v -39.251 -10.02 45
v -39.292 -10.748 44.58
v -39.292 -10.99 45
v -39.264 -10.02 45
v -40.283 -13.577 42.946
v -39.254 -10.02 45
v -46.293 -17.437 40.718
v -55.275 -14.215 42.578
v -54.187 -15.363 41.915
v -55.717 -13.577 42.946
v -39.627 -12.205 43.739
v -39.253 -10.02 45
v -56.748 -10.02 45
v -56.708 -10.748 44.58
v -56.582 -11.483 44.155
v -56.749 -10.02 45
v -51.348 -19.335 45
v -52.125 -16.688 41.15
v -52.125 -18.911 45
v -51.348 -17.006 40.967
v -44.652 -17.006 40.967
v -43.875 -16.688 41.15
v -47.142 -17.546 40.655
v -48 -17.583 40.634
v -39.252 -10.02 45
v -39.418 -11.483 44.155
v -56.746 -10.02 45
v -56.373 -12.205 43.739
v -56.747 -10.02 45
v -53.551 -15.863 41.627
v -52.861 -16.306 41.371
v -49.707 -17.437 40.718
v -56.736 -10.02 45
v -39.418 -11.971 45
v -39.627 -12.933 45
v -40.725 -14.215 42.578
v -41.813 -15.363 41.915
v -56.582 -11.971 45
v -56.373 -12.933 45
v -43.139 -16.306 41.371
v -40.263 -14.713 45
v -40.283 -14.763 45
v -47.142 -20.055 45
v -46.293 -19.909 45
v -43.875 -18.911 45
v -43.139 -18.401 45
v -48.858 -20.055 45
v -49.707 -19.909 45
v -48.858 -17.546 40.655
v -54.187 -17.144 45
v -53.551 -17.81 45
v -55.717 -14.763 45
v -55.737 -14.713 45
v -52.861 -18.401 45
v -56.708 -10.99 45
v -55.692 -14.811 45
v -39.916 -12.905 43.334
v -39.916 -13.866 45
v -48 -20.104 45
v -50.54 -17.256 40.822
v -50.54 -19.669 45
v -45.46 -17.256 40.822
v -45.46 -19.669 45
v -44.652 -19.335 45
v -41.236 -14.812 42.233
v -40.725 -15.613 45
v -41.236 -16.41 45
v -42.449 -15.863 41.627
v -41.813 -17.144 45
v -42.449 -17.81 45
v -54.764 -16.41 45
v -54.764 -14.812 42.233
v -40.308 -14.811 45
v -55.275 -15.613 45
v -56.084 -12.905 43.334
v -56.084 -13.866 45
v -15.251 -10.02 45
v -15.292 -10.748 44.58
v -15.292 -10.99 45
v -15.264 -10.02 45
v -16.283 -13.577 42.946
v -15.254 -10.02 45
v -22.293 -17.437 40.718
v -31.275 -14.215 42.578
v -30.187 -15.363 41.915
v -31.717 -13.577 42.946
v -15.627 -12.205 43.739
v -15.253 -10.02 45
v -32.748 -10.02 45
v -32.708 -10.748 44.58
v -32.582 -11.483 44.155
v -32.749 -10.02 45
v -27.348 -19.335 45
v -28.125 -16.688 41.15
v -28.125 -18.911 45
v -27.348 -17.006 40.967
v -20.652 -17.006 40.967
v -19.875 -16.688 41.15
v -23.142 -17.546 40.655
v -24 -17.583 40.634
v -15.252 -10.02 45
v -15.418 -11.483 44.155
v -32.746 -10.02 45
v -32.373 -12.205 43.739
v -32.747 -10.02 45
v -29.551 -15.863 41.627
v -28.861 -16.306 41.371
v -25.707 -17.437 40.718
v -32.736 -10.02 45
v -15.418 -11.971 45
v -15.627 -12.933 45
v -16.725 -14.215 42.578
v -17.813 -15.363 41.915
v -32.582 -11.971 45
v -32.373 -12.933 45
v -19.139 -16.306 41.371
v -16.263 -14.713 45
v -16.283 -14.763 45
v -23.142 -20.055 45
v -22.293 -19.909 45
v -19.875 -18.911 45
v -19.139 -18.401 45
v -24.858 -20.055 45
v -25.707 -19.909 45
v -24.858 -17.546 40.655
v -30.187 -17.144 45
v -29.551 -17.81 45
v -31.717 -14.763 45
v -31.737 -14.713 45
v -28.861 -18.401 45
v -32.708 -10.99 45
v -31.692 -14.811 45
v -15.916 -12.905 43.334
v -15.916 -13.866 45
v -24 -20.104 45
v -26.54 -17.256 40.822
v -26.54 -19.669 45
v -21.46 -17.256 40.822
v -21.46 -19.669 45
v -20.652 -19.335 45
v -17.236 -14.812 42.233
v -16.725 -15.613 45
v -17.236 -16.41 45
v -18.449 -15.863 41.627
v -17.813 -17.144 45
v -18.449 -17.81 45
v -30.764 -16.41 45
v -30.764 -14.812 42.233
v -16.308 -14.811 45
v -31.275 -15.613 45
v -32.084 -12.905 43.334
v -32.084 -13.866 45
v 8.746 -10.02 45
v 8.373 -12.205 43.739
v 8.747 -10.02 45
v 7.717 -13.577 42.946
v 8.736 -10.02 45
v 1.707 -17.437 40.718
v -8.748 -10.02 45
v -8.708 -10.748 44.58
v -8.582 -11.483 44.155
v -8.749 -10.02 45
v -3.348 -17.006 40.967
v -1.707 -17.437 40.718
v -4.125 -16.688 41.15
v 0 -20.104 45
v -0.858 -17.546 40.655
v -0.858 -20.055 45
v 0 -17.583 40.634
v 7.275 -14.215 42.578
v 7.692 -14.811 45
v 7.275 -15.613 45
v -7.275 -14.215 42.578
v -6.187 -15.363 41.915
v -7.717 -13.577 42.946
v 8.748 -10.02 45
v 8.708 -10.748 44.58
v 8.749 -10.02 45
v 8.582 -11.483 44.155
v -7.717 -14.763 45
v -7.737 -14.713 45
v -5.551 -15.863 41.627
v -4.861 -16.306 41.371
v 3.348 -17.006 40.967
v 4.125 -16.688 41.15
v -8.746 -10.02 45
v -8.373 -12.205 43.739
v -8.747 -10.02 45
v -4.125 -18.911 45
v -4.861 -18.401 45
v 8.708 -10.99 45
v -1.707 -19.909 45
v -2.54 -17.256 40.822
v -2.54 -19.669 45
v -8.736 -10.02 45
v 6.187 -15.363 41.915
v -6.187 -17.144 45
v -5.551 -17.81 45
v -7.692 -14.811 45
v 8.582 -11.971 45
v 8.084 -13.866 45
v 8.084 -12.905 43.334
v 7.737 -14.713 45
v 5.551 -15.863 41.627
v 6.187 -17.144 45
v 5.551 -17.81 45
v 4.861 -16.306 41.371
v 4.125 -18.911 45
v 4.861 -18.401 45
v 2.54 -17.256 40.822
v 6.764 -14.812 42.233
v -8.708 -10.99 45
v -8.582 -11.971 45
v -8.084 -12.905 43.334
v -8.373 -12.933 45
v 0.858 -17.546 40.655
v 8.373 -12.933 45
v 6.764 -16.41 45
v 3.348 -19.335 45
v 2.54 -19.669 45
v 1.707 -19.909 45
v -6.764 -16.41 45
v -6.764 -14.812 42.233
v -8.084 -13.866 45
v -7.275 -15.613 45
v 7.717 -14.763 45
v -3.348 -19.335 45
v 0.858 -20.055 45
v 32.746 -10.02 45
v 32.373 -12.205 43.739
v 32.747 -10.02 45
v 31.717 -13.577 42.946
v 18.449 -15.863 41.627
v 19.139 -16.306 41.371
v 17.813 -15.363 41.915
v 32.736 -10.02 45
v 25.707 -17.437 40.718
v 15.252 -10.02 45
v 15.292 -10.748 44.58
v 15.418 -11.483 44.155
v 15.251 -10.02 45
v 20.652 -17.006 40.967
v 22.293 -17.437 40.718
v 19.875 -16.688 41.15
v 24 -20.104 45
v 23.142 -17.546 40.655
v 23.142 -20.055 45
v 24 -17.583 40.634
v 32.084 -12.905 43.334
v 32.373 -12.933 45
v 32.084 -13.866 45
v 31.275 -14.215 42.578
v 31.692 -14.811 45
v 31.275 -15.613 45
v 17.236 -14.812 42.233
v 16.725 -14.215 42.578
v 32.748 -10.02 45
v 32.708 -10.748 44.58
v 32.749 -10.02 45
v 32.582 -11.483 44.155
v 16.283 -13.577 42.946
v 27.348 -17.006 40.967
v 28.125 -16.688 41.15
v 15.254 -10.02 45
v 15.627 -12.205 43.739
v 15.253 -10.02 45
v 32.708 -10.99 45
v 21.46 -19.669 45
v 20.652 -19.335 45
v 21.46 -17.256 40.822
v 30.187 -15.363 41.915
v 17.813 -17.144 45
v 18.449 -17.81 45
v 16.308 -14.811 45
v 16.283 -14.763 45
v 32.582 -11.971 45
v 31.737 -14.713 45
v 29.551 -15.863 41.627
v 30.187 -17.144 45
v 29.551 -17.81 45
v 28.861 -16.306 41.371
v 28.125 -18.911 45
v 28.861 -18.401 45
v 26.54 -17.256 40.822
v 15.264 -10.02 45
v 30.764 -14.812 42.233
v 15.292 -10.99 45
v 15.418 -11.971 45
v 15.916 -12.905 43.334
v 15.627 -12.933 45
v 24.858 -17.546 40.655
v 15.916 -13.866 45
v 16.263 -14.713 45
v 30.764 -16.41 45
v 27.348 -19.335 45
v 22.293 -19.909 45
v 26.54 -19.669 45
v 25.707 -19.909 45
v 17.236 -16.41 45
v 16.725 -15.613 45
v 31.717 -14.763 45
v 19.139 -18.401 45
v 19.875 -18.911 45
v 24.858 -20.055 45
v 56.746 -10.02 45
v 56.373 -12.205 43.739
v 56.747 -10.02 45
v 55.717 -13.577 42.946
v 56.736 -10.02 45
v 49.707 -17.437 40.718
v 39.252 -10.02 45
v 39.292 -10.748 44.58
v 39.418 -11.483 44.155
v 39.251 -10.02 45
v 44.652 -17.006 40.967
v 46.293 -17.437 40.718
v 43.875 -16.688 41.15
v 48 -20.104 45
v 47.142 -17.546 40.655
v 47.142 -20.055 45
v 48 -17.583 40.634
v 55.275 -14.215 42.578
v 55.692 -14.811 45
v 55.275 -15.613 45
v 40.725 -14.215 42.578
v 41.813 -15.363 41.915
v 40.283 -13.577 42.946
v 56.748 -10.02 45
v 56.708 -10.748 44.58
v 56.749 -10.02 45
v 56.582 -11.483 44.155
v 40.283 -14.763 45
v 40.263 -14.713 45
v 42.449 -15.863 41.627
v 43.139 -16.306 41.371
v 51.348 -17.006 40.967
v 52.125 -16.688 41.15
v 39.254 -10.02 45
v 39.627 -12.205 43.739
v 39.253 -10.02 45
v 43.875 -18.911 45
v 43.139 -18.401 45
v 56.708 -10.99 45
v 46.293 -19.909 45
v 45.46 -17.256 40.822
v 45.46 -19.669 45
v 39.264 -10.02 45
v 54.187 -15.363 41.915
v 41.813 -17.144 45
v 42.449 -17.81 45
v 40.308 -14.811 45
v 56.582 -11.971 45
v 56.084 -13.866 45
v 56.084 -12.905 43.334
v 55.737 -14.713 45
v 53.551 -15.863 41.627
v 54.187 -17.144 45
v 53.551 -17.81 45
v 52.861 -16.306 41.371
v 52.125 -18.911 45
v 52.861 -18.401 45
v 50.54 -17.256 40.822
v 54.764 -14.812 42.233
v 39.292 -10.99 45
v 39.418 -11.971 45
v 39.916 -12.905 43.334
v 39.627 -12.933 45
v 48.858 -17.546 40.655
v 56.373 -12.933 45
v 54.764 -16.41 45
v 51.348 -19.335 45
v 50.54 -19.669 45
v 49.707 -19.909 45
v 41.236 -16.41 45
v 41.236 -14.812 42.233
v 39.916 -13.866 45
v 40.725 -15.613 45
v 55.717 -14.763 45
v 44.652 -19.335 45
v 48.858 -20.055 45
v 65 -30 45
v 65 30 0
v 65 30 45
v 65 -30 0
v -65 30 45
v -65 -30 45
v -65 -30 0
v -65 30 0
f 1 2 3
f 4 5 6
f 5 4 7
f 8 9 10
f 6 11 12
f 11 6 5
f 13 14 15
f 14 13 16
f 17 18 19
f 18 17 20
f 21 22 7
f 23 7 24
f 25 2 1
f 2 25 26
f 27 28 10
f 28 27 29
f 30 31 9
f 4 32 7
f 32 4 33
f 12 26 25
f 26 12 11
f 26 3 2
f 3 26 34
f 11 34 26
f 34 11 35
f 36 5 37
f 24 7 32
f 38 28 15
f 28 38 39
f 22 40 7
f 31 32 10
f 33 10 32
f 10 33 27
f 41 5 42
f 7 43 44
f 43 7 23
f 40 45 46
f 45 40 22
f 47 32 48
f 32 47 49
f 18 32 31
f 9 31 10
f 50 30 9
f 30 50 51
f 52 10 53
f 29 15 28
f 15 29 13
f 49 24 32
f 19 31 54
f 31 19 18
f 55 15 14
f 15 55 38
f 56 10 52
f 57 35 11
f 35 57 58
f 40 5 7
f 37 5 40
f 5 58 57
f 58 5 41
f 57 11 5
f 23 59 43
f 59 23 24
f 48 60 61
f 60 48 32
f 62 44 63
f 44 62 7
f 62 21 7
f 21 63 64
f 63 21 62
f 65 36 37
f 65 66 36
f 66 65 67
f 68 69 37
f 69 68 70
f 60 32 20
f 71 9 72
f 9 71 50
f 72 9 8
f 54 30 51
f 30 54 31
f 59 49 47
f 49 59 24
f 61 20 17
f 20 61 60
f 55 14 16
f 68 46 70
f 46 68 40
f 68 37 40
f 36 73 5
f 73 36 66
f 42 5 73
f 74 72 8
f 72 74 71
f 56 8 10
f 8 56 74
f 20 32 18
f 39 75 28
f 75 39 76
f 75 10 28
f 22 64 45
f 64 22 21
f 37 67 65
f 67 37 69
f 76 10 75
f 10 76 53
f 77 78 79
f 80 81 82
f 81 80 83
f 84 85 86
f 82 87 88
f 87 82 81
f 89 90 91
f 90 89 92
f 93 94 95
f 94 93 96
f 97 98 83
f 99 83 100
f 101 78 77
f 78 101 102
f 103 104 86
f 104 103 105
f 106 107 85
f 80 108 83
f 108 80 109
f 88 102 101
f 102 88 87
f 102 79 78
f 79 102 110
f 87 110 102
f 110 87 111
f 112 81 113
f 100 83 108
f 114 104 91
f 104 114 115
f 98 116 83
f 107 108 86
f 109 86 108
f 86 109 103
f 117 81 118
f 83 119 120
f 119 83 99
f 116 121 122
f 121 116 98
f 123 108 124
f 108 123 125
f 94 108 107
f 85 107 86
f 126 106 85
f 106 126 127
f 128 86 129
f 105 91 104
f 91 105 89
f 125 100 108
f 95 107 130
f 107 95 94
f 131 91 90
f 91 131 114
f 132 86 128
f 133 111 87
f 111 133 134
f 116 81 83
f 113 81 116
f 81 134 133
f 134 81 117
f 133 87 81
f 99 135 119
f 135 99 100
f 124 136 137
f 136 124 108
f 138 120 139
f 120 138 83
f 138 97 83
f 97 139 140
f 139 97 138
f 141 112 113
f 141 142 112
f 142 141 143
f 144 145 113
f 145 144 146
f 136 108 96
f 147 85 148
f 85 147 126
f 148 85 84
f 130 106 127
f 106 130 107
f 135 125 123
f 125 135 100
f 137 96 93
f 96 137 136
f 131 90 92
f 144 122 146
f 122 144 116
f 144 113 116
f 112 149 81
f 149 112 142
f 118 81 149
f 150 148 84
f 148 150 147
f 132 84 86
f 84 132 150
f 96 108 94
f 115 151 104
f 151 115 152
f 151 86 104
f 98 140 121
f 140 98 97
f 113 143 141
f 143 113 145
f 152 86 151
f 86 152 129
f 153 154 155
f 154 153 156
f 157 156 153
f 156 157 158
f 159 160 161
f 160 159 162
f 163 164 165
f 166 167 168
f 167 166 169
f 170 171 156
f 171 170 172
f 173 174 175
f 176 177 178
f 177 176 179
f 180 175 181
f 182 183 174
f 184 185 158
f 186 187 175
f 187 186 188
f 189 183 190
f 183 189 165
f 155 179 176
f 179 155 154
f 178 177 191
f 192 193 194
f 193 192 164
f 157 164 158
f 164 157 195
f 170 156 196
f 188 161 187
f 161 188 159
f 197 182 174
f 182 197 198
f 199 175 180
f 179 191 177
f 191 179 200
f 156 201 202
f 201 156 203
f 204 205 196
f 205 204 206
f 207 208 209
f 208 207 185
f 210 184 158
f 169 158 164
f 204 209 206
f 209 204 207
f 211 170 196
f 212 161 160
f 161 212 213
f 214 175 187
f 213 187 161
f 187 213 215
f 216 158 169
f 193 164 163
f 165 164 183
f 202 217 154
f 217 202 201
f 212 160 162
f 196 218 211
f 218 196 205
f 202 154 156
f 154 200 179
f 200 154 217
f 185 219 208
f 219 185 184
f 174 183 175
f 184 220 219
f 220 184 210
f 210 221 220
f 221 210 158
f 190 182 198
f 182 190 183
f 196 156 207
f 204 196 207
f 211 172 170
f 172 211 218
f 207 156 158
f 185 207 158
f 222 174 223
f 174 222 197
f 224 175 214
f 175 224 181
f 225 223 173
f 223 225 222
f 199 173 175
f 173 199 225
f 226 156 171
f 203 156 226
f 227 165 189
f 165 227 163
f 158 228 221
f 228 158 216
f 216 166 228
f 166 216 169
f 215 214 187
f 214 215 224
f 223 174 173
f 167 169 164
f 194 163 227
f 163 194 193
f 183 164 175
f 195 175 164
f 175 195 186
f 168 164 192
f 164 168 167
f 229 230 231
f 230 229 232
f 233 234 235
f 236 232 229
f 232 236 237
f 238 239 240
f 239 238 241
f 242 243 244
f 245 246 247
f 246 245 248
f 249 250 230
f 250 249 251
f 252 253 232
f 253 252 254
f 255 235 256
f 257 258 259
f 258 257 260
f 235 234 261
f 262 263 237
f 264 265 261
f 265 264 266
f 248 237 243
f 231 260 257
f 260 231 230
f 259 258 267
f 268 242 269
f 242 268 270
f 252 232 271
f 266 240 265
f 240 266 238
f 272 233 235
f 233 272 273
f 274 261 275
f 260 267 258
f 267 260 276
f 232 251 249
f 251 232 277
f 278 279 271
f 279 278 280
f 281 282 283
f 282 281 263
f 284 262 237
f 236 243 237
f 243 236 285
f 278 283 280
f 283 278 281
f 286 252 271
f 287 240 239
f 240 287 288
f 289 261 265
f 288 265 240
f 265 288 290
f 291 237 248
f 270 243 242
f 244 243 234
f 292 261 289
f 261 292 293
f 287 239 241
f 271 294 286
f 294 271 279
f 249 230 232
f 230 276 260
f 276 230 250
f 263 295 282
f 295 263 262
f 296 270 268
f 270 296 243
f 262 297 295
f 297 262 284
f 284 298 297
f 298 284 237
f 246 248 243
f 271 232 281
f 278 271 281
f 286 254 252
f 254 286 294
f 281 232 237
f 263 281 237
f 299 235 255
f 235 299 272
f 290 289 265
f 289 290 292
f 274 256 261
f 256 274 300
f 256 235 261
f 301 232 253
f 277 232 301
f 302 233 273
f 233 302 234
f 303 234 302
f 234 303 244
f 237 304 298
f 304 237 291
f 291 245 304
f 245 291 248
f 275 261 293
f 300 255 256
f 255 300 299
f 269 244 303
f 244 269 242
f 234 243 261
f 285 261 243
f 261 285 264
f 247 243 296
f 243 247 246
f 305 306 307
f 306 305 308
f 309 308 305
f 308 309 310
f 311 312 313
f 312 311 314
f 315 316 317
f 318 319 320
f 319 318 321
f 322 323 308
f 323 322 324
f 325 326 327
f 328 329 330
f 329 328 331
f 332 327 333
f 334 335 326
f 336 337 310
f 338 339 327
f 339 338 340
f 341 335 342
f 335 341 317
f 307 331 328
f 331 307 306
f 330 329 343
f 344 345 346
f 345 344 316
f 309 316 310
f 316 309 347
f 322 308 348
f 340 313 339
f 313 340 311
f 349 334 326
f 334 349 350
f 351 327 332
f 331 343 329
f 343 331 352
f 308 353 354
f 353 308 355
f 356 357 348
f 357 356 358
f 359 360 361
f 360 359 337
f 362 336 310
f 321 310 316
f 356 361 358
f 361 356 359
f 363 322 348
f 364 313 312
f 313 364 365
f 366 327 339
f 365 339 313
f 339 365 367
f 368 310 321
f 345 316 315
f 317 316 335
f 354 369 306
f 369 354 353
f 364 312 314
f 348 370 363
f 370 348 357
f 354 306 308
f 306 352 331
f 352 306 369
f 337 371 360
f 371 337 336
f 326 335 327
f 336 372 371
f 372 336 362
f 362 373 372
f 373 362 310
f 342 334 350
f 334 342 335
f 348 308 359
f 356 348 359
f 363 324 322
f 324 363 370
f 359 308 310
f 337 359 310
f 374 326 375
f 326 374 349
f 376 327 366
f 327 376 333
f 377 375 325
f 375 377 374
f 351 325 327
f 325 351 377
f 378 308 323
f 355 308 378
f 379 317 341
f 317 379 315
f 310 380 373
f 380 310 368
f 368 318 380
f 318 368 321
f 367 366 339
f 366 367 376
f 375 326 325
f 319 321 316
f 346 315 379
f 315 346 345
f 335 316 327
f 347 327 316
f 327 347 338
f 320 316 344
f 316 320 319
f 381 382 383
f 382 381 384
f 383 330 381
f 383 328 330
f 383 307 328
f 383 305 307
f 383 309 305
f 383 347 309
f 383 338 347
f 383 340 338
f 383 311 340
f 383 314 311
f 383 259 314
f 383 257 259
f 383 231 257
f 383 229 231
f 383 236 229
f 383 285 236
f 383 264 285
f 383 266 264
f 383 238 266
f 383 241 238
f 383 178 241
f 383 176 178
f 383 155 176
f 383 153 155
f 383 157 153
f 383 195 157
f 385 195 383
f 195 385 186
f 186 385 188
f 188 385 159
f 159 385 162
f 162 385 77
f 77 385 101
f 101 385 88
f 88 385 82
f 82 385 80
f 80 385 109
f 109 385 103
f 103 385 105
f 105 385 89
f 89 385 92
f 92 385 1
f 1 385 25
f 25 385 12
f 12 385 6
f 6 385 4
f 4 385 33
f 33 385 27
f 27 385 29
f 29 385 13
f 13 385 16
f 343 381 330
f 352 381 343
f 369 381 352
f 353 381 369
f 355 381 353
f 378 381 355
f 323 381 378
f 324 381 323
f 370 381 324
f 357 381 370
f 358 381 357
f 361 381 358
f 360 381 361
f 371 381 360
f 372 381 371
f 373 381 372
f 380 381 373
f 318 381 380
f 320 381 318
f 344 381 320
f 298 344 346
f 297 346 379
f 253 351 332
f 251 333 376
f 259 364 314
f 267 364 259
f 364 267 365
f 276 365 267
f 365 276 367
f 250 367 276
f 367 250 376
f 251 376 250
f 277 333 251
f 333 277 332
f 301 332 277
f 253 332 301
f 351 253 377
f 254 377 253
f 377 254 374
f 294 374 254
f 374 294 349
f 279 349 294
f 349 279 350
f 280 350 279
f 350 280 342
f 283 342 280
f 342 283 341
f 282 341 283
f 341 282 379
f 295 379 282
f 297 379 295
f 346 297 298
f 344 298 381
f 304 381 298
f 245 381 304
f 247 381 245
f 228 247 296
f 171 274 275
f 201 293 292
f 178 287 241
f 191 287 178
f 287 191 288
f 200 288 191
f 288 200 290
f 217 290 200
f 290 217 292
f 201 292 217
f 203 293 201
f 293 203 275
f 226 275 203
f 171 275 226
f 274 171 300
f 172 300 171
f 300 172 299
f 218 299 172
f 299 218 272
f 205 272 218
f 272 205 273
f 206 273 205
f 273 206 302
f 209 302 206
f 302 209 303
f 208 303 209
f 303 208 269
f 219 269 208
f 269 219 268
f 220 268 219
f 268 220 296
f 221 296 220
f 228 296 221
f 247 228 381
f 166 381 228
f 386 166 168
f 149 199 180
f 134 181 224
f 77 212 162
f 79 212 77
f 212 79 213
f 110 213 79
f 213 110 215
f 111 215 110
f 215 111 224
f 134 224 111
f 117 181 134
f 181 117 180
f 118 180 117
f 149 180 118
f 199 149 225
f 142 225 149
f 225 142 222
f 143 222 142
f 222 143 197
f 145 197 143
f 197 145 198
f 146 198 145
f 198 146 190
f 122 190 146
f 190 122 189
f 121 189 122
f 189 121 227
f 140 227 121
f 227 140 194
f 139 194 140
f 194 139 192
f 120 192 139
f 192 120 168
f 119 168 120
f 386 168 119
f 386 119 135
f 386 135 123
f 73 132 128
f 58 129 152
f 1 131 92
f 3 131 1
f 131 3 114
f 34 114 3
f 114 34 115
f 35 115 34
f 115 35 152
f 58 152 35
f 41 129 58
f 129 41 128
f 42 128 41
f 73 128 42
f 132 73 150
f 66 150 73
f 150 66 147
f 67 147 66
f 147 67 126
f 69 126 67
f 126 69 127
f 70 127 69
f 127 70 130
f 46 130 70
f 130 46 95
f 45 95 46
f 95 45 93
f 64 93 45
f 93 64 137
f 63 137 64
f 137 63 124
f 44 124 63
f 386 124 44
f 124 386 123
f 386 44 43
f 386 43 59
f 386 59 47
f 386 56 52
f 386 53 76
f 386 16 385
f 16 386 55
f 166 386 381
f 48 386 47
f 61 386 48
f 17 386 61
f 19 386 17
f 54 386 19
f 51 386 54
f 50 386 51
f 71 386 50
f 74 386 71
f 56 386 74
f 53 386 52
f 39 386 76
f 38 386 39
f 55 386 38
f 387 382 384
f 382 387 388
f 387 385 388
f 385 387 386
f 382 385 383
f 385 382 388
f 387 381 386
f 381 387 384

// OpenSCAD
// --- Parameters ---
// Block dimensions
block_x = 130;           // Total length (X)
block_y = 60;            // Total depth (Y)
block_z = 45;            // Total height (Z)

// Hole properties
hole_diameter = 17.5;    // Diameter of the conical tube hole
hole_depth = 40;         // Depth of the hole along its axis
num_holes = 5;           // Number of tubes
hole_spacing = 24;       // Distance between hole centers along X

// Tilt properties
tilt_angle = 30;         // Angle from vertical in YZ plane
tilt_y_offset = -10;      // Y-coordinate where the hole axis meets the top face

// Resolution
fn_val = 64;             // Smoothness for cylinders

// --- Calculations ---
// The block is centered on X and Y, resting on Z=0.
// X range: [-65, 65], Y range: [-30, 30], Z range: [0, 45]
hole_span = (num_holes - 1) * hole_spacing;
first_hole_x = -hole_span / 2;

// --- Modeling ---

difference() {
    // Main Block
    // Positioned so it rests on Z=0 and is centered on X and Y
    translate([-block_x/2, -block_y/2, 0])
        cube([block_x, block_y, block_z]);

    // The five blind holes
    for (i = [0 : num_holes - 1]) {
        // Calculate X position for this specific hole
        current_hole_x = first_hole_x + (i * hole_spacing);
        
        // The hole axis meets the top face at (current_hole_x, tilt_y_offset, block_z)
        // "Going down into the block, it moves toward +Y"
        // To tilt the Z-axis towards +Y, we rotate around the X-axis.
        // In OpenSCAD, rotate([angle, 0, 0]) rotates the Z-axis towards the Y-axis 
        // if the angle is positive. 
        // Let's verify: rotate([30, 0, 0]) of vector [0,0,1] is [0, sin(30), cos(30)].
        // This moves the axis towards +Y as Z decreases.
        
        translate([current_hole_x, tilt_y_offset, block_z]) 
        rotate([tilt_angle, 0, 0]) 
        // We use a cylinder that is slightly longer and offset to ensure it cuts 
        // through the top face cleanly and has a flat end.
        // To ensure a flat end at the bottom of the hole, we use a cylinder 
        // and translate it so the top face of the cylinder is at the top face of the block.
        // Since we rotated, we must translate along the new Z axis.
        translate([0, 0, 0.01]) 
        cylinder(h = hole_depth + 2, d = hole_diameter, $fn = fn_val);
    }
}

// Note on the rotation direction:
// The previous iteration used rotate([-30, 0, 0]) which moved the axis towards -Y.
// The requirement is "moves toward +Y". 
// A positive rotation around X moves the +Z axis towards the +Y axis.
// Therefore, rotate([30, 0, 0]) is the correct transformation.
